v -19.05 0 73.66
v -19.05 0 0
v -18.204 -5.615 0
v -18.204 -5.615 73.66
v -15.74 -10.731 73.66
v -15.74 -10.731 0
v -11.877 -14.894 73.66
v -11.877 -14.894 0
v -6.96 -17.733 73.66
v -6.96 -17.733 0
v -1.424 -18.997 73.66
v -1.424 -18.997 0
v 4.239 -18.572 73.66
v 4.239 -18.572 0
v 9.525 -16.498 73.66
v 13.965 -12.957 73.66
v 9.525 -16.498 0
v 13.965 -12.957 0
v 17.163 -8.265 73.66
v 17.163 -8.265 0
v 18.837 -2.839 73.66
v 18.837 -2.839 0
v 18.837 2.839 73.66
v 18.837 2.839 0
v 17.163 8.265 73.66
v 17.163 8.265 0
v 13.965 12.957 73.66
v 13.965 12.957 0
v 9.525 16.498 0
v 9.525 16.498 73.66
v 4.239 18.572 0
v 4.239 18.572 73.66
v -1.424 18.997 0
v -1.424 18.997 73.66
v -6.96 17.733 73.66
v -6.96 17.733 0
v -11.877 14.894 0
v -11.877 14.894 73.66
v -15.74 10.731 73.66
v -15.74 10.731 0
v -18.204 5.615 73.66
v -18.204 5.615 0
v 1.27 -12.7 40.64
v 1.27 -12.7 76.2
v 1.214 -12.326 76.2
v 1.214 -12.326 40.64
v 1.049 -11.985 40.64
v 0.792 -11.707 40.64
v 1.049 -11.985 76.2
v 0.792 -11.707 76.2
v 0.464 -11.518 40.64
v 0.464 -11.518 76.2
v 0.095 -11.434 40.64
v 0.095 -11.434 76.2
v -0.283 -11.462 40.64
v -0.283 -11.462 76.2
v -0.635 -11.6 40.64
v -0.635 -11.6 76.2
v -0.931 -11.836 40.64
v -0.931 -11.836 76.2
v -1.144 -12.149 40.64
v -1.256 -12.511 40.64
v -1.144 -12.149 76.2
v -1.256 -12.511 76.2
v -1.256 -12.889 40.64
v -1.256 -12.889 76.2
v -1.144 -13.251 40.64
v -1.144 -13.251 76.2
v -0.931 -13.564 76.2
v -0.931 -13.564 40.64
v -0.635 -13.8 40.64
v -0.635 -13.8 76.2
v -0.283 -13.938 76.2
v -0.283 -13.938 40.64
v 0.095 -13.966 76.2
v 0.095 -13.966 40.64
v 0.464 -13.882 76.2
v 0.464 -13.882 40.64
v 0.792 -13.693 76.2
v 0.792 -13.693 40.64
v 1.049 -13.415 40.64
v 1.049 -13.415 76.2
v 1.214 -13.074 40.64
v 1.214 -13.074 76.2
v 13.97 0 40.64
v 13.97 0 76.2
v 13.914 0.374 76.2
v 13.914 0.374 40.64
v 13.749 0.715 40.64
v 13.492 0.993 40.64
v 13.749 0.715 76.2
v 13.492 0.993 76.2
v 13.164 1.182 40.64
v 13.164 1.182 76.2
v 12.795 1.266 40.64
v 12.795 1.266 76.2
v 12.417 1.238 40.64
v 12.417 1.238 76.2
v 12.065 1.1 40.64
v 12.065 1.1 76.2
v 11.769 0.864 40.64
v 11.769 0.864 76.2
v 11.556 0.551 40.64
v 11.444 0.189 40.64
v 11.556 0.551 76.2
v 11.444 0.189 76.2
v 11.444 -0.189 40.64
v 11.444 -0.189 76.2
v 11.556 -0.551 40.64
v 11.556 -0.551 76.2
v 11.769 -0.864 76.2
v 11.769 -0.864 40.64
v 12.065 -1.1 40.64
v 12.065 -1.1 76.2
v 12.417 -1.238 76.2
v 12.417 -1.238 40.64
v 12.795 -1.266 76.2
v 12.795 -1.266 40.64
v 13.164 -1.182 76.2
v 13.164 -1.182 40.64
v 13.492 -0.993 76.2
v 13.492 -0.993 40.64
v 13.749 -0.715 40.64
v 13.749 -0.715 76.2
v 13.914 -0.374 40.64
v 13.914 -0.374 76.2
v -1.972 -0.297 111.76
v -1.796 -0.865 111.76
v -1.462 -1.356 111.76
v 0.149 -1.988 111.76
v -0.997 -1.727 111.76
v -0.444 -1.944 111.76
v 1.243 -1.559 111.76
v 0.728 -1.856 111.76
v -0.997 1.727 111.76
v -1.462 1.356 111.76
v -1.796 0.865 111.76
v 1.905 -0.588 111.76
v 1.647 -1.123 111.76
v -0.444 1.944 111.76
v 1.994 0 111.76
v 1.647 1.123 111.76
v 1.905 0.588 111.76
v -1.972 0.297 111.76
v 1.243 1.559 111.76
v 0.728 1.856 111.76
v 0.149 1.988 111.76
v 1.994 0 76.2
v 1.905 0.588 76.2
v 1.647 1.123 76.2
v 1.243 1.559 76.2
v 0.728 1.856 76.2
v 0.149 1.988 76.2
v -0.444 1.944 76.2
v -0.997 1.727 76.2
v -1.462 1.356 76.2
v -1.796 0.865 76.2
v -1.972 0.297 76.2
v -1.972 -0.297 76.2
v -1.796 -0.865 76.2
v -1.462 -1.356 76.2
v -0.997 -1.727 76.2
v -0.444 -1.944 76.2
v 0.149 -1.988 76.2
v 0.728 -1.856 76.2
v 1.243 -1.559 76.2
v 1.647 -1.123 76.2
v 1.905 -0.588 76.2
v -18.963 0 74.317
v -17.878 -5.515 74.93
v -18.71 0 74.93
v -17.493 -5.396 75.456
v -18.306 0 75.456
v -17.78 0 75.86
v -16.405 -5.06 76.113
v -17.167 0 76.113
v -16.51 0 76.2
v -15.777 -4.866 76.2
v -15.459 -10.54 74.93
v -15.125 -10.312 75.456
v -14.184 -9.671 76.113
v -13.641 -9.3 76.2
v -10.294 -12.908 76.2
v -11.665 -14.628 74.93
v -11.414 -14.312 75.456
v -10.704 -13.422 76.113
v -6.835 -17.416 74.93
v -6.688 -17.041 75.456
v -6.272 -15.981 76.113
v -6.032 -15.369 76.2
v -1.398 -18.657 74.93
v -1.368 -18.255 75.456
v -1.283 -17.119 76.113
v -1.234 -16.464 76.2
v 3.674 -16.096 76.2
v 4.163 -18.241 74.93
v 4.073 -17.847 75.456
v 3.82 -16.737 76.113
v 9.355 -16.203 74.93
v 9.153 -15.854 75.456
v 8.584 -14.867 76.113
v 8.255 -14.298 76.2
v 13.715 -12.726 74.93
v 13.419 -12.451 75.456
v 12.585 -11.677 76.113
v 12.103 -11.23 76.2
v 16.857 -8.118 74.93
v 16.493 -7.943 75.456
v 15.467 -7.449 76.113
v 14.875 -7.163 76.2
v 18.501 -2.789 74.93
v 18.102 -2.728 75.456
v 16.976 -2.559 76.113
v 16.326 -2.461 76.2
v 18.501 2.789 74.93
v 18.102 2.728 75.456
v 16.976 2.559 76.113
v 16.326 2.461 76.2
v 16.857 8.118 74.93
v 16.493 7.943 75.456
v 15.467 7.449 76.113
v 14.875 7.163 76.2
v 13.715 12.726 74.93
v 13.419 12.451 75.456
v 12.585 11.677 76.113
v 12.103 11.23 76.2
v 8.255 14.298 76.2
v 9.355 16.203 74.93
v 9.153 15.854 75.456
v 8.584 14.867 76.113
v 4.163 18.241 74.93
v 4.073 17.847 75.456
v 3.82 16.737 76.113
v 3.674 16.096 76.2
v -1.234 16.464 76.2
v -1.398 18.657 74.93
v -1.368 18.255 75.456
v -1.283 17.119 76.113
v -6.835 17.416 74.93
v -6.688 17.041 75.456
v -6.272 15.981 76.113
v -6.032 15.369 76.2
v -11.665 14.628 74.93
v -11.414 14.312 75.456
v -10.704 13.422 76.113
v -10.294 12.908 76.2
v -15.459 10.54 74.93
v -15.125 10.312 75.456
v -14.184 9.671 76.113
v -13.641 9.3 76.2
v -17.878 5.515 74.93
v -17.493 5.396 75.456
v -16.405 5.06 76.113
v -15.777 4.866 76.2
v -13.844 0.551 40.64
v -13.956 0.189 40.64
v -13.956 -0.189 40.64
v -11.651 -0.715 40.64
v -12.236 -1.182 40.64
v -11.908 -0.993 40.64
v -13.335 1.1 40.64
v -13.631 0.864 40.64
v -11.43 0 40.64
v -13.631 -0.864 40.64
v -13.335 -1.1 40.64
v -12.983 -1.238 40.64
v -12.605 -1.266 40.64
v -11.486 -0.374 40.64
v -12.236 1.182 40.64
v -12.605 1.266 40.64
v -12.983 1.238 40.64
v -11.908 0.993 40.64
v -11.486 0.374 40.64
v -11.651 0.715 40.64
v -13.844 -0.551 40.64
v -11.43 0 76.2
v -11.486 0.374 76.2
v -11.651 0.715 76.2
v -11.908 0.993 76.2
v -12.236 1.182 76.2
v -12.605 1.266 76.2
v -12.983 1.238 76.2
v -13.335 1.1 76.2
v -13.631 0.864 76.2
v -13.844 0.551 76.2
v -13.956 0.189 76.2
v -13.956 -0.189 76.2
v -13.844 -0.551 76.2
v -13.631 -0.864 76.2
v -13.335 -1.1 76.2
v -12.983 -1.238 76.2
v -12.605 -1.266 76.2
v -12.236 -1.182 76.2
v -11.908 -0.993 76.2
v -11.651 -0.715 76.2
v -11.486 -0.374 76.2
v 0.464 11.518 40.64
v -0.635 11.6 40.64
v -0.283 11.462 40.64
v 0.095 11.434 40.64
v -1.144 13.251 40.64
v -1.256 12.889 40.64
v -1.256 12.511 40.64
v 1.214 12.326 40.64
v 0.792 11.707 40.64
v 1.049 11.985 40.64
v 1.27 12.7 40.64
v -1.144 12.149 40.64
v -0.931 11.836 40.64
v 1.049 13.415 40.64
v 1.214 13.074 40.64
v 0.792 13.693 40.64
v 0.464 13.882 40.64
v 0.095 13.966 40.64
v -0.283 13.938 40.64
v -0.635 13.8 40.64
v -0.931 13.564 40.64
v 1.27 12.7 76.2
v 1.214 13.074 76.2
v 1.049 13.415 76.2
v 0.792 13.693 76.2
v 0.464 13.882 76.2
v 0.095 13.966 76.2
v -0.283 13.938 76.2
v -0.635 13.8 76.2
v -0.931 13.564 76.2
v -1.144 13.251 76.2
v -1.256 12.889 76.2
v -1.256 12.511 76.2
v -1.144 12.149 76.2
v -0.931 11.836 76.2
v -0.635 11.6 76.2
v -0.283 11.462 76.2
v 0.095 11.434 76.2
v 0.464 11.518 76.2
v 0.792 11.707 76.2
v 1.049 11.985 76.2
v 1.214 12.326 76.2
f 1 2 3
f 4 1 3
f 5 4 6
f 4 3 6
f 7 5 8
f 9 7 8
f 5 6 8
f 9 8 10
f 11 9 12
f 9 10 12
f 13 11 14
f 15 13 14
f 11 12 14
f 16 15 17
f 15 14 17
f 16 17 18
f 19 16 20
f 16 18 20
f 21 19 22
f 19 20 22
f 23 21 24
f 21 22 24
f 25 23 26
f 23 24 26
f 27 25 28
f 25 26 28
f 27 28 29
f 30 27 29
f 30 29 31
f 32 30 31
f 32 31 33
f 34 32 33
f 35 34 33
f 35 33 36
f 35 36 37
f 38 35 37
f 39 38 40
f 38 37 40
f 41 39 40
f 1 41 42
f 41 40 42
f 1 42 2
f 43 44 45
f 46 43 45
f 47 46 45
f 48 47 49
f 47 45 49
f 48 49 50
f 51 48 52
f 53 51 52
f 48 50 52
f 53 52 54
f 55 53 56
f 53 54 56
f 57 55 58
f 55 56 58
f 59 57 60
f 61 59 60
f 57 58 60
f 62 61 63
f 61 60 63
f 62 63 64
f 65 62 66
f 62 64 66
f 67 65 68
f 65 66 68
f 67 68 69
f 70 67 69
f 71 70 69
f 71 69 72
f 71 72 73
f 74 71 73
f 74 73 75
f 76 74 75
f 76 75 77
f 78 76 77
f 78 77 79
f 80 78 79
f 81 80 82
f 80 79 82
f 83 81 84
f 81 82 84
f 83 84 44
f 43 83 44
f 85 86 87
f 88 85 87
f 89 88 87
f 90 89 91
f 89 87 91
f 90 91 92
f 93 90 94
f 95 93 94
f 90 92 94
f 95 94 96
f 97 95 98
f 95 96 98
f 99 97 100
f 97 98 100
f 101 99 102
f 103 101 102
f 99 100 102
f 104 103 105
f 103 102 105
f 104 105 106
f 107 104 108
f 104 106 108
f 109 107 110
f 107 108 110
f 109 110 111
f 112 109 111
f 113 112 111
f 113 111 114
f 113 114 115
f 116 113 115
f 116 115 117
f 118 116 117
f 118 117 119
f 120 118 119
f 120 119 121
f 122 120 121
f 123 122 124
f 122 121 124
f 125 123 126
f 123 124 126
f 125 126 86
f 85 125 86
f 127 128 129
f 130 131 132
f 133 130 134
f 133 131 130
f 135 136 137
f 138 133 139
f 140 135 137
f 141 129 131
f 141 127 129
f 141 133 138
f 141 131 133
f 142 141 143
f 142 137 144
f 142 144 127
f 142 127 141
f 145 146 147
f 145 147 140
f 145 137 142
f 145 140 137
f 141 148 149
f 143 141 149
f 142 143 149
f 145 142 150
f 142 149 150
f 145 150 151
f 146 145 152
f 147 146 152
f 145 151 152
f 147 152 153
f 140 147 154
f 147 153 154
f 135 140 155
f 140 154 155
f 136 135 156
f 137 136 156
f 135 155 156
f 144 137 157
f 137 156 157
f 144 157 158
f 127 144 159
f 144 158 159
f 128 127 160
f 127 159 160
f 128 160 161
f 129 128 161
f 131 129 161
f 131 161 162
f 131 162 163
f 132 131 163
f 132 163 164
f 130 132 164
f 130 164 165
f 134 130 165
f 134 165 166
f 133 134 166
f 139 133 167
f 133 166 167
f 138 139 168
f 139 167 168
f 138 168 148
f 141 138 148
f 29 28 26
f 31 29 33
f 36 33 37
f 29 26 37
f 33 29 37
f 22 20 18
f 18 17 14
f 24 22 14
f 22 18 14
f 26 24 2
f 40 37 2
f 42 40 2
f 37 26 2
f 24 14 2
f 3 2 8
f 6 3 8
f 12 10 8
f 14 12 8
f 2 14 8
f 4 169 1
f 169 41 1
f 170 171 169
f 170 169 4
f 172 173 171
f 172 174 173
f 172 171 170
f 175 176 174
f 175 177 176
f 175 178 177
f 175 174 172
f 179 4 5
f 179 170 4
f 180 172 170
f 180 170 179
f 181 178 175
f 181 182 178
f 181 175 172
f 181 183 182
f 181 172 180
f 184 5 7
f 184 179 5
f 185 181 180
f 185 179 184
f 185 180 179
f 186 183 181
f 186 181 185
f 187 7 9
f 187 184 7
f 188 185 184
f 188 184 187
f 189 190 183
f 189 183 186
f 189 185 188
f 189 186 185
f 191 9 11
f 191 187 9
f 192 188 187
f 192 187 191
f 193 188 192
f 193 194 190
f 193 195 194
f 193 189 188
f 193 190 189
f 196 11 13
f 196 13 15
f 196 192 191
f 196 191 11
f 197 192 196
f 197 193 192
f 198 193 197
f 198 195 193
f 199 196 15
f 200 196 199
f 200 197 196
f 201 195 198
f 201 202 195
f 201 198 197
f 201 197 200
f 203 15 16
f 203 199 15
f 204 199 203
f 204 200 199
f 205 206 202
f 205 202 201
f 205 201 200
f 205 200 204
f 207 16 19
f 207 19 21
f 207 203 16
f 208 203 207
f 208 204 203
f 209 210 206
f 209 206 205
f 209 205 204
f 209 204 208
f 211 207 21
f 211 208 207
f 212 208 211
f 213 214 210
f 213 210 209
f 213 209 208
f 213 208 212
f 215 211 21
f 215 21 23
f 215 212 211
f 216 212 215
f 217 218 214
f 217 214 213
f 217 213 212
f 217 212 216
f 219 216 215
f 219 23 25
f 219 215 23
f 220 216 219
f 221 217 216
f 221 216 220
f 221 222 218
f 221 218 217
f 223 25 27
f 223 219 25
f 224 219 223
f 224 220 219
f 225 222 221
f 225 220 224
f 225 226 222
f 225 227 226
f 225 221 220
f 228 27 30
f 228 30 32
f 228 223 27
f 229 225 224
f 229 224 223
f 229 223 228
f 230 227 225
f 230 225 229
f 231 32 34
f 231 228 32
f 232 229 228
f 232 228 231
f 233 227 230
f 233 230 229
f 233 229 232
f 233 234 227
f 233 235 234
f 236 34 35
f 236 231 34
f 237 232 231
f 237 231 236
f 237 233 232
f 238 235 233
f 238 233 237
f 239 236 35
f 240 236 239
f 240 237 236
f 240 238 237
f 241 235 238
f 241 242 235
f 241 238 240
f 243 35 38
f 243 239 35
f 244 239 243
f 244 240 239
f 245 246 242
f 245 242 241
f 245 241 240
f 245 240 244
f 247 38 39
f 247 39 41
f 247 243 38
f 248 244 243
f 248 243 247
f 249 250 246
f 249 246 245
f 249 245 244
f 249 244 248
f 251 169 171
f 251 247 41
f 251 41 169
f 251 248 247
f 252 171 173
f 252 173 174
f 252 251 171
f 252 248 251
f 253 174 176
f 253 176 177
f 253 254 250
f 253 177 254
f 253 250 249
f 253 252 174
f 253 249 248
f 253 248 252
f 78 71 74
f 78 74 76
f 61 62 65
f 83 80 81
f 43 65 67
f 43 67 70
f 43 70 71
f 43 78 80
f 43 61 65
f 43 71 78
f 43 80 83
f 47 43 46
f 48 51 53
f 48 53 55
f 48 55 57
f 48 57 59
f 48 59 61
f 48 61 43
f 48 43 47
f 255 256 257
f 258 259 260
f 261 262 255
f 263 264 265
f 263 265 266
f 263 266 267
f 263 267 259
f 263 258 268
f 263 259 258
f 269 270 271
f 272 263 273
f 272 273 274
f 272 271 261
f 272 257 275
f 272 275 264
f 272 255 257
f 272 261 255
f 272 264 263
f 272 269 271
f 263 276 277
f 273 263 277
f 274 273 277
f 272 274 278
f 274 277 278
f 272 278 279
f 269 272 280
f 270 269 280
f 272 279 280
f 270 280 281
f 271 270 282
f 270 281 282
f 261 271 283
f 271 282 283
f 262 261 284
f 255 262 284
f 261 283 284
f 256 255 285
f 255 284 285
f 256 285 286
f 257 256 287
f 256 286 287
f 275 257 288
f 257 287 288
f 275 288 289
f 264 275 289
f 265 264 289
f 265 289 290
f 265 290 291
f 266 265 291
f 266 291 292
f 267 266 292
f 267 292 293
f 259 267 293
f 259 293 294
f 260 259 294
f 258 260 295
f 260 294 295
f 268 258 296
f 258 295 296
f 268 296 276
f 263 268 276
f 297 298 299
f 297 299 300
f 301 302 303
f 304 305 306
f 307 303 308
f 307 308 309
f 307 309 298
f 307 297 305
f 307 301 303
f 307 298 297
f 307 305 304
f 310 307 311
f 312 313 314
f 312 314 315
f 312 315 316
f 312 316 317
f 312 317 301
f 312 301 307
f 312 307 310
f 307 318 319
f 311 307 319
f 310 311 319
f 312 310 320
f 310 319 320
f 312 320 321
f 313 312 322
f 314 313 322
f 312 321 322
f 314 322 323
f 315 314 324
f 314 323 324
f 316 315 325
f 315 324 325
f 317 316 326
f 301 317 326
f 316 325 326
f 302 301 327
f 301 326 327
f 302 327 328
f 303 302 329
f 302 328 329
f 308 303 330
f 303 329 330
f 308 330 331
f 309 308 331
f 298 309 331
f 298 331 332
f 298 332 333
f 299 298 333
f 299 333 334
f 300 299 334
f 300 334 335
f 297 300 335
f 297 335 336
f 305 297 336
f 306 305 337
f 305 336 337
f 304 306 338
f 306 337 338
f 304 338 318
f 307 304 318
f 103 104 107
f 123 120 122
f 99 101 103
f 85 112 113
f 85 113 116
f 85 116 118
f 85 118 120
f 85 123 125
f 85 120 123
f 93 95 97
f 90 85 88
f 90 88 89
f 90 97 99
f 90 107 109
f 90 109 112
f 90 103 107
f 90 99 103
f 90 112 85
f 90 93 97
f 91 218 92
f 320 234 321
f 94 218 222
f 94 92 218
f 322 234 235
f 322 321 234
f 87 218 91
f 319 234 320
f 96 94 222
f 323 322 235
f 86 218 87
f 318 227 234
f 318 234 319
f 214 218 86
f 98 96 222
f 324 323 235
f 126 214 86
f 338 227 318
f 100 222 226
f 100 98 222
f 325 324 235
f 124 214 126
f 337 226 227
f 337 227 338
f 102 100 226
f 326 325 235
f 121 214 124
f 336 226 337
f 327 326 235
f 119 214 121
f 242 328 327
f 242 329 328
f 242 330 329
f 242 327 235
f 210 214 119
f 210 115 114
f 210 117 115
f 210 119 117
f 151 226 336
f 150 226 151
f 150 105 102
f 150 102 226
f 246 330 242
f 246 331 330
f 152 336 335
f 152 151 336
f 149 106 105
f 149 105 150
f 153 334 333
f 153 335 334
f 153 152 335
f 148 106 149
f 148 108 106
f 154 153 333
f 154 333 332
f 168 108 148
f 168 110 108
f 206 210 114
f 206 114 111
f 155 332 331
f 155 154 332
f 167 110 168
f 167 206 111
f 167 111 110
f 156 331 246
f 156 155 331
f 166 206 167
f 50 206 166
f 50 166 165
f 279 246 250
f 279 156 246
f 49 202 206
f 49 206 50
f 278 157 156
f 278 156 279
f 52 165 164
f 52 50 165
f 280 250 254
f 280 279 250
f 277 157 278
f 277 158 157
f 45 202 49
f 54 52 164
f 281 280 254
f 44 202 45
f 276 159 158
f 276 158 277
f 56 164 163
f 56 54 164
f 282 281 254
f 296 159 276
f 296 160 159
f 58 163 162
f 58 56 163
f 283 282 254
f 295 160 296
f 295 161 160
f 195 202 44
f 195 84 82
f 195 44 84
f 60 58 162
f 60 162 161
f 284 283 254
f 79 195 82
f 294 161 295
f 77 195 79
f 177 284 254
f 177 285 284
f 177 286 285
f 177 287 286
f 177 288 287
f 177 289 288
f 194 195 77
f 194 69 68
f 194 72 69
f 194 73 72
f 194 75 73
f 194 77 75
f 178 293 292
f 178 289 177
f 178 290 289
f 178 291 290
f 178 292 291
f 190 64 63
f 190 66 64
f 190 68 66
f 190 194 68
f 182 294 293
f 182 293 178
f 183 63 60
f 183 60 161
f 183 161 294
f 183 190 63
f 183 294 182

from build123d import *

# Parameters (mm, degrees)
SKETCH1_R           = 19.05
BOSS_EXTRUDE1_DEPTH = 76.2
FILLET2_R           = 2.54
SKETCH2_R           = 1.9939
BOSS_EXTRUDE2_DEPTH = 35.56
SKETCH3_R           = 1.27
CUT_EXTRUDE1_DEPTH  = 35.56


with BuildPart() as part:
    # Sketch1 → Boss-Extrude1 (new body)
    with BuildSketch(Plane.XY):
        Circle(SKETCH1_R)
    extrude(amount=BOSS_EXTRUDE1_DEPTH)

    # Fillet2
    fillet2_edges = [part.edges().sort_by_distance(p)[0] for p in [
        (-19.05, 0, 76.2),
    ]]
    fillet(fillet2_edges, radius=FILLET2_R)

    # Sketch2 → Boss-Extrude2 (add)
    with BuildSketch(Plane.XY.offset(76.2)):
        Circle(SKETCH2_R)
    extrude(amount=BOSS_EXTRUDE2_DEPTH)

    # Sketch3 → Cut-Extrude1 (cut)
    with BuildSketch(Plane.XY.offset(76.2)):
        with Locations((12.7, 0)):
            Circle(SKETCH3_R)
        with Locations((0, -12.7)):
            Circle(SKETCH3_R)
        with Locations((-12.7, 0)):
            Circle(SKETCH3_R)
        with Locations((0, 12.7)):
            Circle(SKETCH3_R)
    extrude(amount=-CUT_EXTRUDE1_DEPTH, mode=Mode.SUBTRACT)


solid = part.part
